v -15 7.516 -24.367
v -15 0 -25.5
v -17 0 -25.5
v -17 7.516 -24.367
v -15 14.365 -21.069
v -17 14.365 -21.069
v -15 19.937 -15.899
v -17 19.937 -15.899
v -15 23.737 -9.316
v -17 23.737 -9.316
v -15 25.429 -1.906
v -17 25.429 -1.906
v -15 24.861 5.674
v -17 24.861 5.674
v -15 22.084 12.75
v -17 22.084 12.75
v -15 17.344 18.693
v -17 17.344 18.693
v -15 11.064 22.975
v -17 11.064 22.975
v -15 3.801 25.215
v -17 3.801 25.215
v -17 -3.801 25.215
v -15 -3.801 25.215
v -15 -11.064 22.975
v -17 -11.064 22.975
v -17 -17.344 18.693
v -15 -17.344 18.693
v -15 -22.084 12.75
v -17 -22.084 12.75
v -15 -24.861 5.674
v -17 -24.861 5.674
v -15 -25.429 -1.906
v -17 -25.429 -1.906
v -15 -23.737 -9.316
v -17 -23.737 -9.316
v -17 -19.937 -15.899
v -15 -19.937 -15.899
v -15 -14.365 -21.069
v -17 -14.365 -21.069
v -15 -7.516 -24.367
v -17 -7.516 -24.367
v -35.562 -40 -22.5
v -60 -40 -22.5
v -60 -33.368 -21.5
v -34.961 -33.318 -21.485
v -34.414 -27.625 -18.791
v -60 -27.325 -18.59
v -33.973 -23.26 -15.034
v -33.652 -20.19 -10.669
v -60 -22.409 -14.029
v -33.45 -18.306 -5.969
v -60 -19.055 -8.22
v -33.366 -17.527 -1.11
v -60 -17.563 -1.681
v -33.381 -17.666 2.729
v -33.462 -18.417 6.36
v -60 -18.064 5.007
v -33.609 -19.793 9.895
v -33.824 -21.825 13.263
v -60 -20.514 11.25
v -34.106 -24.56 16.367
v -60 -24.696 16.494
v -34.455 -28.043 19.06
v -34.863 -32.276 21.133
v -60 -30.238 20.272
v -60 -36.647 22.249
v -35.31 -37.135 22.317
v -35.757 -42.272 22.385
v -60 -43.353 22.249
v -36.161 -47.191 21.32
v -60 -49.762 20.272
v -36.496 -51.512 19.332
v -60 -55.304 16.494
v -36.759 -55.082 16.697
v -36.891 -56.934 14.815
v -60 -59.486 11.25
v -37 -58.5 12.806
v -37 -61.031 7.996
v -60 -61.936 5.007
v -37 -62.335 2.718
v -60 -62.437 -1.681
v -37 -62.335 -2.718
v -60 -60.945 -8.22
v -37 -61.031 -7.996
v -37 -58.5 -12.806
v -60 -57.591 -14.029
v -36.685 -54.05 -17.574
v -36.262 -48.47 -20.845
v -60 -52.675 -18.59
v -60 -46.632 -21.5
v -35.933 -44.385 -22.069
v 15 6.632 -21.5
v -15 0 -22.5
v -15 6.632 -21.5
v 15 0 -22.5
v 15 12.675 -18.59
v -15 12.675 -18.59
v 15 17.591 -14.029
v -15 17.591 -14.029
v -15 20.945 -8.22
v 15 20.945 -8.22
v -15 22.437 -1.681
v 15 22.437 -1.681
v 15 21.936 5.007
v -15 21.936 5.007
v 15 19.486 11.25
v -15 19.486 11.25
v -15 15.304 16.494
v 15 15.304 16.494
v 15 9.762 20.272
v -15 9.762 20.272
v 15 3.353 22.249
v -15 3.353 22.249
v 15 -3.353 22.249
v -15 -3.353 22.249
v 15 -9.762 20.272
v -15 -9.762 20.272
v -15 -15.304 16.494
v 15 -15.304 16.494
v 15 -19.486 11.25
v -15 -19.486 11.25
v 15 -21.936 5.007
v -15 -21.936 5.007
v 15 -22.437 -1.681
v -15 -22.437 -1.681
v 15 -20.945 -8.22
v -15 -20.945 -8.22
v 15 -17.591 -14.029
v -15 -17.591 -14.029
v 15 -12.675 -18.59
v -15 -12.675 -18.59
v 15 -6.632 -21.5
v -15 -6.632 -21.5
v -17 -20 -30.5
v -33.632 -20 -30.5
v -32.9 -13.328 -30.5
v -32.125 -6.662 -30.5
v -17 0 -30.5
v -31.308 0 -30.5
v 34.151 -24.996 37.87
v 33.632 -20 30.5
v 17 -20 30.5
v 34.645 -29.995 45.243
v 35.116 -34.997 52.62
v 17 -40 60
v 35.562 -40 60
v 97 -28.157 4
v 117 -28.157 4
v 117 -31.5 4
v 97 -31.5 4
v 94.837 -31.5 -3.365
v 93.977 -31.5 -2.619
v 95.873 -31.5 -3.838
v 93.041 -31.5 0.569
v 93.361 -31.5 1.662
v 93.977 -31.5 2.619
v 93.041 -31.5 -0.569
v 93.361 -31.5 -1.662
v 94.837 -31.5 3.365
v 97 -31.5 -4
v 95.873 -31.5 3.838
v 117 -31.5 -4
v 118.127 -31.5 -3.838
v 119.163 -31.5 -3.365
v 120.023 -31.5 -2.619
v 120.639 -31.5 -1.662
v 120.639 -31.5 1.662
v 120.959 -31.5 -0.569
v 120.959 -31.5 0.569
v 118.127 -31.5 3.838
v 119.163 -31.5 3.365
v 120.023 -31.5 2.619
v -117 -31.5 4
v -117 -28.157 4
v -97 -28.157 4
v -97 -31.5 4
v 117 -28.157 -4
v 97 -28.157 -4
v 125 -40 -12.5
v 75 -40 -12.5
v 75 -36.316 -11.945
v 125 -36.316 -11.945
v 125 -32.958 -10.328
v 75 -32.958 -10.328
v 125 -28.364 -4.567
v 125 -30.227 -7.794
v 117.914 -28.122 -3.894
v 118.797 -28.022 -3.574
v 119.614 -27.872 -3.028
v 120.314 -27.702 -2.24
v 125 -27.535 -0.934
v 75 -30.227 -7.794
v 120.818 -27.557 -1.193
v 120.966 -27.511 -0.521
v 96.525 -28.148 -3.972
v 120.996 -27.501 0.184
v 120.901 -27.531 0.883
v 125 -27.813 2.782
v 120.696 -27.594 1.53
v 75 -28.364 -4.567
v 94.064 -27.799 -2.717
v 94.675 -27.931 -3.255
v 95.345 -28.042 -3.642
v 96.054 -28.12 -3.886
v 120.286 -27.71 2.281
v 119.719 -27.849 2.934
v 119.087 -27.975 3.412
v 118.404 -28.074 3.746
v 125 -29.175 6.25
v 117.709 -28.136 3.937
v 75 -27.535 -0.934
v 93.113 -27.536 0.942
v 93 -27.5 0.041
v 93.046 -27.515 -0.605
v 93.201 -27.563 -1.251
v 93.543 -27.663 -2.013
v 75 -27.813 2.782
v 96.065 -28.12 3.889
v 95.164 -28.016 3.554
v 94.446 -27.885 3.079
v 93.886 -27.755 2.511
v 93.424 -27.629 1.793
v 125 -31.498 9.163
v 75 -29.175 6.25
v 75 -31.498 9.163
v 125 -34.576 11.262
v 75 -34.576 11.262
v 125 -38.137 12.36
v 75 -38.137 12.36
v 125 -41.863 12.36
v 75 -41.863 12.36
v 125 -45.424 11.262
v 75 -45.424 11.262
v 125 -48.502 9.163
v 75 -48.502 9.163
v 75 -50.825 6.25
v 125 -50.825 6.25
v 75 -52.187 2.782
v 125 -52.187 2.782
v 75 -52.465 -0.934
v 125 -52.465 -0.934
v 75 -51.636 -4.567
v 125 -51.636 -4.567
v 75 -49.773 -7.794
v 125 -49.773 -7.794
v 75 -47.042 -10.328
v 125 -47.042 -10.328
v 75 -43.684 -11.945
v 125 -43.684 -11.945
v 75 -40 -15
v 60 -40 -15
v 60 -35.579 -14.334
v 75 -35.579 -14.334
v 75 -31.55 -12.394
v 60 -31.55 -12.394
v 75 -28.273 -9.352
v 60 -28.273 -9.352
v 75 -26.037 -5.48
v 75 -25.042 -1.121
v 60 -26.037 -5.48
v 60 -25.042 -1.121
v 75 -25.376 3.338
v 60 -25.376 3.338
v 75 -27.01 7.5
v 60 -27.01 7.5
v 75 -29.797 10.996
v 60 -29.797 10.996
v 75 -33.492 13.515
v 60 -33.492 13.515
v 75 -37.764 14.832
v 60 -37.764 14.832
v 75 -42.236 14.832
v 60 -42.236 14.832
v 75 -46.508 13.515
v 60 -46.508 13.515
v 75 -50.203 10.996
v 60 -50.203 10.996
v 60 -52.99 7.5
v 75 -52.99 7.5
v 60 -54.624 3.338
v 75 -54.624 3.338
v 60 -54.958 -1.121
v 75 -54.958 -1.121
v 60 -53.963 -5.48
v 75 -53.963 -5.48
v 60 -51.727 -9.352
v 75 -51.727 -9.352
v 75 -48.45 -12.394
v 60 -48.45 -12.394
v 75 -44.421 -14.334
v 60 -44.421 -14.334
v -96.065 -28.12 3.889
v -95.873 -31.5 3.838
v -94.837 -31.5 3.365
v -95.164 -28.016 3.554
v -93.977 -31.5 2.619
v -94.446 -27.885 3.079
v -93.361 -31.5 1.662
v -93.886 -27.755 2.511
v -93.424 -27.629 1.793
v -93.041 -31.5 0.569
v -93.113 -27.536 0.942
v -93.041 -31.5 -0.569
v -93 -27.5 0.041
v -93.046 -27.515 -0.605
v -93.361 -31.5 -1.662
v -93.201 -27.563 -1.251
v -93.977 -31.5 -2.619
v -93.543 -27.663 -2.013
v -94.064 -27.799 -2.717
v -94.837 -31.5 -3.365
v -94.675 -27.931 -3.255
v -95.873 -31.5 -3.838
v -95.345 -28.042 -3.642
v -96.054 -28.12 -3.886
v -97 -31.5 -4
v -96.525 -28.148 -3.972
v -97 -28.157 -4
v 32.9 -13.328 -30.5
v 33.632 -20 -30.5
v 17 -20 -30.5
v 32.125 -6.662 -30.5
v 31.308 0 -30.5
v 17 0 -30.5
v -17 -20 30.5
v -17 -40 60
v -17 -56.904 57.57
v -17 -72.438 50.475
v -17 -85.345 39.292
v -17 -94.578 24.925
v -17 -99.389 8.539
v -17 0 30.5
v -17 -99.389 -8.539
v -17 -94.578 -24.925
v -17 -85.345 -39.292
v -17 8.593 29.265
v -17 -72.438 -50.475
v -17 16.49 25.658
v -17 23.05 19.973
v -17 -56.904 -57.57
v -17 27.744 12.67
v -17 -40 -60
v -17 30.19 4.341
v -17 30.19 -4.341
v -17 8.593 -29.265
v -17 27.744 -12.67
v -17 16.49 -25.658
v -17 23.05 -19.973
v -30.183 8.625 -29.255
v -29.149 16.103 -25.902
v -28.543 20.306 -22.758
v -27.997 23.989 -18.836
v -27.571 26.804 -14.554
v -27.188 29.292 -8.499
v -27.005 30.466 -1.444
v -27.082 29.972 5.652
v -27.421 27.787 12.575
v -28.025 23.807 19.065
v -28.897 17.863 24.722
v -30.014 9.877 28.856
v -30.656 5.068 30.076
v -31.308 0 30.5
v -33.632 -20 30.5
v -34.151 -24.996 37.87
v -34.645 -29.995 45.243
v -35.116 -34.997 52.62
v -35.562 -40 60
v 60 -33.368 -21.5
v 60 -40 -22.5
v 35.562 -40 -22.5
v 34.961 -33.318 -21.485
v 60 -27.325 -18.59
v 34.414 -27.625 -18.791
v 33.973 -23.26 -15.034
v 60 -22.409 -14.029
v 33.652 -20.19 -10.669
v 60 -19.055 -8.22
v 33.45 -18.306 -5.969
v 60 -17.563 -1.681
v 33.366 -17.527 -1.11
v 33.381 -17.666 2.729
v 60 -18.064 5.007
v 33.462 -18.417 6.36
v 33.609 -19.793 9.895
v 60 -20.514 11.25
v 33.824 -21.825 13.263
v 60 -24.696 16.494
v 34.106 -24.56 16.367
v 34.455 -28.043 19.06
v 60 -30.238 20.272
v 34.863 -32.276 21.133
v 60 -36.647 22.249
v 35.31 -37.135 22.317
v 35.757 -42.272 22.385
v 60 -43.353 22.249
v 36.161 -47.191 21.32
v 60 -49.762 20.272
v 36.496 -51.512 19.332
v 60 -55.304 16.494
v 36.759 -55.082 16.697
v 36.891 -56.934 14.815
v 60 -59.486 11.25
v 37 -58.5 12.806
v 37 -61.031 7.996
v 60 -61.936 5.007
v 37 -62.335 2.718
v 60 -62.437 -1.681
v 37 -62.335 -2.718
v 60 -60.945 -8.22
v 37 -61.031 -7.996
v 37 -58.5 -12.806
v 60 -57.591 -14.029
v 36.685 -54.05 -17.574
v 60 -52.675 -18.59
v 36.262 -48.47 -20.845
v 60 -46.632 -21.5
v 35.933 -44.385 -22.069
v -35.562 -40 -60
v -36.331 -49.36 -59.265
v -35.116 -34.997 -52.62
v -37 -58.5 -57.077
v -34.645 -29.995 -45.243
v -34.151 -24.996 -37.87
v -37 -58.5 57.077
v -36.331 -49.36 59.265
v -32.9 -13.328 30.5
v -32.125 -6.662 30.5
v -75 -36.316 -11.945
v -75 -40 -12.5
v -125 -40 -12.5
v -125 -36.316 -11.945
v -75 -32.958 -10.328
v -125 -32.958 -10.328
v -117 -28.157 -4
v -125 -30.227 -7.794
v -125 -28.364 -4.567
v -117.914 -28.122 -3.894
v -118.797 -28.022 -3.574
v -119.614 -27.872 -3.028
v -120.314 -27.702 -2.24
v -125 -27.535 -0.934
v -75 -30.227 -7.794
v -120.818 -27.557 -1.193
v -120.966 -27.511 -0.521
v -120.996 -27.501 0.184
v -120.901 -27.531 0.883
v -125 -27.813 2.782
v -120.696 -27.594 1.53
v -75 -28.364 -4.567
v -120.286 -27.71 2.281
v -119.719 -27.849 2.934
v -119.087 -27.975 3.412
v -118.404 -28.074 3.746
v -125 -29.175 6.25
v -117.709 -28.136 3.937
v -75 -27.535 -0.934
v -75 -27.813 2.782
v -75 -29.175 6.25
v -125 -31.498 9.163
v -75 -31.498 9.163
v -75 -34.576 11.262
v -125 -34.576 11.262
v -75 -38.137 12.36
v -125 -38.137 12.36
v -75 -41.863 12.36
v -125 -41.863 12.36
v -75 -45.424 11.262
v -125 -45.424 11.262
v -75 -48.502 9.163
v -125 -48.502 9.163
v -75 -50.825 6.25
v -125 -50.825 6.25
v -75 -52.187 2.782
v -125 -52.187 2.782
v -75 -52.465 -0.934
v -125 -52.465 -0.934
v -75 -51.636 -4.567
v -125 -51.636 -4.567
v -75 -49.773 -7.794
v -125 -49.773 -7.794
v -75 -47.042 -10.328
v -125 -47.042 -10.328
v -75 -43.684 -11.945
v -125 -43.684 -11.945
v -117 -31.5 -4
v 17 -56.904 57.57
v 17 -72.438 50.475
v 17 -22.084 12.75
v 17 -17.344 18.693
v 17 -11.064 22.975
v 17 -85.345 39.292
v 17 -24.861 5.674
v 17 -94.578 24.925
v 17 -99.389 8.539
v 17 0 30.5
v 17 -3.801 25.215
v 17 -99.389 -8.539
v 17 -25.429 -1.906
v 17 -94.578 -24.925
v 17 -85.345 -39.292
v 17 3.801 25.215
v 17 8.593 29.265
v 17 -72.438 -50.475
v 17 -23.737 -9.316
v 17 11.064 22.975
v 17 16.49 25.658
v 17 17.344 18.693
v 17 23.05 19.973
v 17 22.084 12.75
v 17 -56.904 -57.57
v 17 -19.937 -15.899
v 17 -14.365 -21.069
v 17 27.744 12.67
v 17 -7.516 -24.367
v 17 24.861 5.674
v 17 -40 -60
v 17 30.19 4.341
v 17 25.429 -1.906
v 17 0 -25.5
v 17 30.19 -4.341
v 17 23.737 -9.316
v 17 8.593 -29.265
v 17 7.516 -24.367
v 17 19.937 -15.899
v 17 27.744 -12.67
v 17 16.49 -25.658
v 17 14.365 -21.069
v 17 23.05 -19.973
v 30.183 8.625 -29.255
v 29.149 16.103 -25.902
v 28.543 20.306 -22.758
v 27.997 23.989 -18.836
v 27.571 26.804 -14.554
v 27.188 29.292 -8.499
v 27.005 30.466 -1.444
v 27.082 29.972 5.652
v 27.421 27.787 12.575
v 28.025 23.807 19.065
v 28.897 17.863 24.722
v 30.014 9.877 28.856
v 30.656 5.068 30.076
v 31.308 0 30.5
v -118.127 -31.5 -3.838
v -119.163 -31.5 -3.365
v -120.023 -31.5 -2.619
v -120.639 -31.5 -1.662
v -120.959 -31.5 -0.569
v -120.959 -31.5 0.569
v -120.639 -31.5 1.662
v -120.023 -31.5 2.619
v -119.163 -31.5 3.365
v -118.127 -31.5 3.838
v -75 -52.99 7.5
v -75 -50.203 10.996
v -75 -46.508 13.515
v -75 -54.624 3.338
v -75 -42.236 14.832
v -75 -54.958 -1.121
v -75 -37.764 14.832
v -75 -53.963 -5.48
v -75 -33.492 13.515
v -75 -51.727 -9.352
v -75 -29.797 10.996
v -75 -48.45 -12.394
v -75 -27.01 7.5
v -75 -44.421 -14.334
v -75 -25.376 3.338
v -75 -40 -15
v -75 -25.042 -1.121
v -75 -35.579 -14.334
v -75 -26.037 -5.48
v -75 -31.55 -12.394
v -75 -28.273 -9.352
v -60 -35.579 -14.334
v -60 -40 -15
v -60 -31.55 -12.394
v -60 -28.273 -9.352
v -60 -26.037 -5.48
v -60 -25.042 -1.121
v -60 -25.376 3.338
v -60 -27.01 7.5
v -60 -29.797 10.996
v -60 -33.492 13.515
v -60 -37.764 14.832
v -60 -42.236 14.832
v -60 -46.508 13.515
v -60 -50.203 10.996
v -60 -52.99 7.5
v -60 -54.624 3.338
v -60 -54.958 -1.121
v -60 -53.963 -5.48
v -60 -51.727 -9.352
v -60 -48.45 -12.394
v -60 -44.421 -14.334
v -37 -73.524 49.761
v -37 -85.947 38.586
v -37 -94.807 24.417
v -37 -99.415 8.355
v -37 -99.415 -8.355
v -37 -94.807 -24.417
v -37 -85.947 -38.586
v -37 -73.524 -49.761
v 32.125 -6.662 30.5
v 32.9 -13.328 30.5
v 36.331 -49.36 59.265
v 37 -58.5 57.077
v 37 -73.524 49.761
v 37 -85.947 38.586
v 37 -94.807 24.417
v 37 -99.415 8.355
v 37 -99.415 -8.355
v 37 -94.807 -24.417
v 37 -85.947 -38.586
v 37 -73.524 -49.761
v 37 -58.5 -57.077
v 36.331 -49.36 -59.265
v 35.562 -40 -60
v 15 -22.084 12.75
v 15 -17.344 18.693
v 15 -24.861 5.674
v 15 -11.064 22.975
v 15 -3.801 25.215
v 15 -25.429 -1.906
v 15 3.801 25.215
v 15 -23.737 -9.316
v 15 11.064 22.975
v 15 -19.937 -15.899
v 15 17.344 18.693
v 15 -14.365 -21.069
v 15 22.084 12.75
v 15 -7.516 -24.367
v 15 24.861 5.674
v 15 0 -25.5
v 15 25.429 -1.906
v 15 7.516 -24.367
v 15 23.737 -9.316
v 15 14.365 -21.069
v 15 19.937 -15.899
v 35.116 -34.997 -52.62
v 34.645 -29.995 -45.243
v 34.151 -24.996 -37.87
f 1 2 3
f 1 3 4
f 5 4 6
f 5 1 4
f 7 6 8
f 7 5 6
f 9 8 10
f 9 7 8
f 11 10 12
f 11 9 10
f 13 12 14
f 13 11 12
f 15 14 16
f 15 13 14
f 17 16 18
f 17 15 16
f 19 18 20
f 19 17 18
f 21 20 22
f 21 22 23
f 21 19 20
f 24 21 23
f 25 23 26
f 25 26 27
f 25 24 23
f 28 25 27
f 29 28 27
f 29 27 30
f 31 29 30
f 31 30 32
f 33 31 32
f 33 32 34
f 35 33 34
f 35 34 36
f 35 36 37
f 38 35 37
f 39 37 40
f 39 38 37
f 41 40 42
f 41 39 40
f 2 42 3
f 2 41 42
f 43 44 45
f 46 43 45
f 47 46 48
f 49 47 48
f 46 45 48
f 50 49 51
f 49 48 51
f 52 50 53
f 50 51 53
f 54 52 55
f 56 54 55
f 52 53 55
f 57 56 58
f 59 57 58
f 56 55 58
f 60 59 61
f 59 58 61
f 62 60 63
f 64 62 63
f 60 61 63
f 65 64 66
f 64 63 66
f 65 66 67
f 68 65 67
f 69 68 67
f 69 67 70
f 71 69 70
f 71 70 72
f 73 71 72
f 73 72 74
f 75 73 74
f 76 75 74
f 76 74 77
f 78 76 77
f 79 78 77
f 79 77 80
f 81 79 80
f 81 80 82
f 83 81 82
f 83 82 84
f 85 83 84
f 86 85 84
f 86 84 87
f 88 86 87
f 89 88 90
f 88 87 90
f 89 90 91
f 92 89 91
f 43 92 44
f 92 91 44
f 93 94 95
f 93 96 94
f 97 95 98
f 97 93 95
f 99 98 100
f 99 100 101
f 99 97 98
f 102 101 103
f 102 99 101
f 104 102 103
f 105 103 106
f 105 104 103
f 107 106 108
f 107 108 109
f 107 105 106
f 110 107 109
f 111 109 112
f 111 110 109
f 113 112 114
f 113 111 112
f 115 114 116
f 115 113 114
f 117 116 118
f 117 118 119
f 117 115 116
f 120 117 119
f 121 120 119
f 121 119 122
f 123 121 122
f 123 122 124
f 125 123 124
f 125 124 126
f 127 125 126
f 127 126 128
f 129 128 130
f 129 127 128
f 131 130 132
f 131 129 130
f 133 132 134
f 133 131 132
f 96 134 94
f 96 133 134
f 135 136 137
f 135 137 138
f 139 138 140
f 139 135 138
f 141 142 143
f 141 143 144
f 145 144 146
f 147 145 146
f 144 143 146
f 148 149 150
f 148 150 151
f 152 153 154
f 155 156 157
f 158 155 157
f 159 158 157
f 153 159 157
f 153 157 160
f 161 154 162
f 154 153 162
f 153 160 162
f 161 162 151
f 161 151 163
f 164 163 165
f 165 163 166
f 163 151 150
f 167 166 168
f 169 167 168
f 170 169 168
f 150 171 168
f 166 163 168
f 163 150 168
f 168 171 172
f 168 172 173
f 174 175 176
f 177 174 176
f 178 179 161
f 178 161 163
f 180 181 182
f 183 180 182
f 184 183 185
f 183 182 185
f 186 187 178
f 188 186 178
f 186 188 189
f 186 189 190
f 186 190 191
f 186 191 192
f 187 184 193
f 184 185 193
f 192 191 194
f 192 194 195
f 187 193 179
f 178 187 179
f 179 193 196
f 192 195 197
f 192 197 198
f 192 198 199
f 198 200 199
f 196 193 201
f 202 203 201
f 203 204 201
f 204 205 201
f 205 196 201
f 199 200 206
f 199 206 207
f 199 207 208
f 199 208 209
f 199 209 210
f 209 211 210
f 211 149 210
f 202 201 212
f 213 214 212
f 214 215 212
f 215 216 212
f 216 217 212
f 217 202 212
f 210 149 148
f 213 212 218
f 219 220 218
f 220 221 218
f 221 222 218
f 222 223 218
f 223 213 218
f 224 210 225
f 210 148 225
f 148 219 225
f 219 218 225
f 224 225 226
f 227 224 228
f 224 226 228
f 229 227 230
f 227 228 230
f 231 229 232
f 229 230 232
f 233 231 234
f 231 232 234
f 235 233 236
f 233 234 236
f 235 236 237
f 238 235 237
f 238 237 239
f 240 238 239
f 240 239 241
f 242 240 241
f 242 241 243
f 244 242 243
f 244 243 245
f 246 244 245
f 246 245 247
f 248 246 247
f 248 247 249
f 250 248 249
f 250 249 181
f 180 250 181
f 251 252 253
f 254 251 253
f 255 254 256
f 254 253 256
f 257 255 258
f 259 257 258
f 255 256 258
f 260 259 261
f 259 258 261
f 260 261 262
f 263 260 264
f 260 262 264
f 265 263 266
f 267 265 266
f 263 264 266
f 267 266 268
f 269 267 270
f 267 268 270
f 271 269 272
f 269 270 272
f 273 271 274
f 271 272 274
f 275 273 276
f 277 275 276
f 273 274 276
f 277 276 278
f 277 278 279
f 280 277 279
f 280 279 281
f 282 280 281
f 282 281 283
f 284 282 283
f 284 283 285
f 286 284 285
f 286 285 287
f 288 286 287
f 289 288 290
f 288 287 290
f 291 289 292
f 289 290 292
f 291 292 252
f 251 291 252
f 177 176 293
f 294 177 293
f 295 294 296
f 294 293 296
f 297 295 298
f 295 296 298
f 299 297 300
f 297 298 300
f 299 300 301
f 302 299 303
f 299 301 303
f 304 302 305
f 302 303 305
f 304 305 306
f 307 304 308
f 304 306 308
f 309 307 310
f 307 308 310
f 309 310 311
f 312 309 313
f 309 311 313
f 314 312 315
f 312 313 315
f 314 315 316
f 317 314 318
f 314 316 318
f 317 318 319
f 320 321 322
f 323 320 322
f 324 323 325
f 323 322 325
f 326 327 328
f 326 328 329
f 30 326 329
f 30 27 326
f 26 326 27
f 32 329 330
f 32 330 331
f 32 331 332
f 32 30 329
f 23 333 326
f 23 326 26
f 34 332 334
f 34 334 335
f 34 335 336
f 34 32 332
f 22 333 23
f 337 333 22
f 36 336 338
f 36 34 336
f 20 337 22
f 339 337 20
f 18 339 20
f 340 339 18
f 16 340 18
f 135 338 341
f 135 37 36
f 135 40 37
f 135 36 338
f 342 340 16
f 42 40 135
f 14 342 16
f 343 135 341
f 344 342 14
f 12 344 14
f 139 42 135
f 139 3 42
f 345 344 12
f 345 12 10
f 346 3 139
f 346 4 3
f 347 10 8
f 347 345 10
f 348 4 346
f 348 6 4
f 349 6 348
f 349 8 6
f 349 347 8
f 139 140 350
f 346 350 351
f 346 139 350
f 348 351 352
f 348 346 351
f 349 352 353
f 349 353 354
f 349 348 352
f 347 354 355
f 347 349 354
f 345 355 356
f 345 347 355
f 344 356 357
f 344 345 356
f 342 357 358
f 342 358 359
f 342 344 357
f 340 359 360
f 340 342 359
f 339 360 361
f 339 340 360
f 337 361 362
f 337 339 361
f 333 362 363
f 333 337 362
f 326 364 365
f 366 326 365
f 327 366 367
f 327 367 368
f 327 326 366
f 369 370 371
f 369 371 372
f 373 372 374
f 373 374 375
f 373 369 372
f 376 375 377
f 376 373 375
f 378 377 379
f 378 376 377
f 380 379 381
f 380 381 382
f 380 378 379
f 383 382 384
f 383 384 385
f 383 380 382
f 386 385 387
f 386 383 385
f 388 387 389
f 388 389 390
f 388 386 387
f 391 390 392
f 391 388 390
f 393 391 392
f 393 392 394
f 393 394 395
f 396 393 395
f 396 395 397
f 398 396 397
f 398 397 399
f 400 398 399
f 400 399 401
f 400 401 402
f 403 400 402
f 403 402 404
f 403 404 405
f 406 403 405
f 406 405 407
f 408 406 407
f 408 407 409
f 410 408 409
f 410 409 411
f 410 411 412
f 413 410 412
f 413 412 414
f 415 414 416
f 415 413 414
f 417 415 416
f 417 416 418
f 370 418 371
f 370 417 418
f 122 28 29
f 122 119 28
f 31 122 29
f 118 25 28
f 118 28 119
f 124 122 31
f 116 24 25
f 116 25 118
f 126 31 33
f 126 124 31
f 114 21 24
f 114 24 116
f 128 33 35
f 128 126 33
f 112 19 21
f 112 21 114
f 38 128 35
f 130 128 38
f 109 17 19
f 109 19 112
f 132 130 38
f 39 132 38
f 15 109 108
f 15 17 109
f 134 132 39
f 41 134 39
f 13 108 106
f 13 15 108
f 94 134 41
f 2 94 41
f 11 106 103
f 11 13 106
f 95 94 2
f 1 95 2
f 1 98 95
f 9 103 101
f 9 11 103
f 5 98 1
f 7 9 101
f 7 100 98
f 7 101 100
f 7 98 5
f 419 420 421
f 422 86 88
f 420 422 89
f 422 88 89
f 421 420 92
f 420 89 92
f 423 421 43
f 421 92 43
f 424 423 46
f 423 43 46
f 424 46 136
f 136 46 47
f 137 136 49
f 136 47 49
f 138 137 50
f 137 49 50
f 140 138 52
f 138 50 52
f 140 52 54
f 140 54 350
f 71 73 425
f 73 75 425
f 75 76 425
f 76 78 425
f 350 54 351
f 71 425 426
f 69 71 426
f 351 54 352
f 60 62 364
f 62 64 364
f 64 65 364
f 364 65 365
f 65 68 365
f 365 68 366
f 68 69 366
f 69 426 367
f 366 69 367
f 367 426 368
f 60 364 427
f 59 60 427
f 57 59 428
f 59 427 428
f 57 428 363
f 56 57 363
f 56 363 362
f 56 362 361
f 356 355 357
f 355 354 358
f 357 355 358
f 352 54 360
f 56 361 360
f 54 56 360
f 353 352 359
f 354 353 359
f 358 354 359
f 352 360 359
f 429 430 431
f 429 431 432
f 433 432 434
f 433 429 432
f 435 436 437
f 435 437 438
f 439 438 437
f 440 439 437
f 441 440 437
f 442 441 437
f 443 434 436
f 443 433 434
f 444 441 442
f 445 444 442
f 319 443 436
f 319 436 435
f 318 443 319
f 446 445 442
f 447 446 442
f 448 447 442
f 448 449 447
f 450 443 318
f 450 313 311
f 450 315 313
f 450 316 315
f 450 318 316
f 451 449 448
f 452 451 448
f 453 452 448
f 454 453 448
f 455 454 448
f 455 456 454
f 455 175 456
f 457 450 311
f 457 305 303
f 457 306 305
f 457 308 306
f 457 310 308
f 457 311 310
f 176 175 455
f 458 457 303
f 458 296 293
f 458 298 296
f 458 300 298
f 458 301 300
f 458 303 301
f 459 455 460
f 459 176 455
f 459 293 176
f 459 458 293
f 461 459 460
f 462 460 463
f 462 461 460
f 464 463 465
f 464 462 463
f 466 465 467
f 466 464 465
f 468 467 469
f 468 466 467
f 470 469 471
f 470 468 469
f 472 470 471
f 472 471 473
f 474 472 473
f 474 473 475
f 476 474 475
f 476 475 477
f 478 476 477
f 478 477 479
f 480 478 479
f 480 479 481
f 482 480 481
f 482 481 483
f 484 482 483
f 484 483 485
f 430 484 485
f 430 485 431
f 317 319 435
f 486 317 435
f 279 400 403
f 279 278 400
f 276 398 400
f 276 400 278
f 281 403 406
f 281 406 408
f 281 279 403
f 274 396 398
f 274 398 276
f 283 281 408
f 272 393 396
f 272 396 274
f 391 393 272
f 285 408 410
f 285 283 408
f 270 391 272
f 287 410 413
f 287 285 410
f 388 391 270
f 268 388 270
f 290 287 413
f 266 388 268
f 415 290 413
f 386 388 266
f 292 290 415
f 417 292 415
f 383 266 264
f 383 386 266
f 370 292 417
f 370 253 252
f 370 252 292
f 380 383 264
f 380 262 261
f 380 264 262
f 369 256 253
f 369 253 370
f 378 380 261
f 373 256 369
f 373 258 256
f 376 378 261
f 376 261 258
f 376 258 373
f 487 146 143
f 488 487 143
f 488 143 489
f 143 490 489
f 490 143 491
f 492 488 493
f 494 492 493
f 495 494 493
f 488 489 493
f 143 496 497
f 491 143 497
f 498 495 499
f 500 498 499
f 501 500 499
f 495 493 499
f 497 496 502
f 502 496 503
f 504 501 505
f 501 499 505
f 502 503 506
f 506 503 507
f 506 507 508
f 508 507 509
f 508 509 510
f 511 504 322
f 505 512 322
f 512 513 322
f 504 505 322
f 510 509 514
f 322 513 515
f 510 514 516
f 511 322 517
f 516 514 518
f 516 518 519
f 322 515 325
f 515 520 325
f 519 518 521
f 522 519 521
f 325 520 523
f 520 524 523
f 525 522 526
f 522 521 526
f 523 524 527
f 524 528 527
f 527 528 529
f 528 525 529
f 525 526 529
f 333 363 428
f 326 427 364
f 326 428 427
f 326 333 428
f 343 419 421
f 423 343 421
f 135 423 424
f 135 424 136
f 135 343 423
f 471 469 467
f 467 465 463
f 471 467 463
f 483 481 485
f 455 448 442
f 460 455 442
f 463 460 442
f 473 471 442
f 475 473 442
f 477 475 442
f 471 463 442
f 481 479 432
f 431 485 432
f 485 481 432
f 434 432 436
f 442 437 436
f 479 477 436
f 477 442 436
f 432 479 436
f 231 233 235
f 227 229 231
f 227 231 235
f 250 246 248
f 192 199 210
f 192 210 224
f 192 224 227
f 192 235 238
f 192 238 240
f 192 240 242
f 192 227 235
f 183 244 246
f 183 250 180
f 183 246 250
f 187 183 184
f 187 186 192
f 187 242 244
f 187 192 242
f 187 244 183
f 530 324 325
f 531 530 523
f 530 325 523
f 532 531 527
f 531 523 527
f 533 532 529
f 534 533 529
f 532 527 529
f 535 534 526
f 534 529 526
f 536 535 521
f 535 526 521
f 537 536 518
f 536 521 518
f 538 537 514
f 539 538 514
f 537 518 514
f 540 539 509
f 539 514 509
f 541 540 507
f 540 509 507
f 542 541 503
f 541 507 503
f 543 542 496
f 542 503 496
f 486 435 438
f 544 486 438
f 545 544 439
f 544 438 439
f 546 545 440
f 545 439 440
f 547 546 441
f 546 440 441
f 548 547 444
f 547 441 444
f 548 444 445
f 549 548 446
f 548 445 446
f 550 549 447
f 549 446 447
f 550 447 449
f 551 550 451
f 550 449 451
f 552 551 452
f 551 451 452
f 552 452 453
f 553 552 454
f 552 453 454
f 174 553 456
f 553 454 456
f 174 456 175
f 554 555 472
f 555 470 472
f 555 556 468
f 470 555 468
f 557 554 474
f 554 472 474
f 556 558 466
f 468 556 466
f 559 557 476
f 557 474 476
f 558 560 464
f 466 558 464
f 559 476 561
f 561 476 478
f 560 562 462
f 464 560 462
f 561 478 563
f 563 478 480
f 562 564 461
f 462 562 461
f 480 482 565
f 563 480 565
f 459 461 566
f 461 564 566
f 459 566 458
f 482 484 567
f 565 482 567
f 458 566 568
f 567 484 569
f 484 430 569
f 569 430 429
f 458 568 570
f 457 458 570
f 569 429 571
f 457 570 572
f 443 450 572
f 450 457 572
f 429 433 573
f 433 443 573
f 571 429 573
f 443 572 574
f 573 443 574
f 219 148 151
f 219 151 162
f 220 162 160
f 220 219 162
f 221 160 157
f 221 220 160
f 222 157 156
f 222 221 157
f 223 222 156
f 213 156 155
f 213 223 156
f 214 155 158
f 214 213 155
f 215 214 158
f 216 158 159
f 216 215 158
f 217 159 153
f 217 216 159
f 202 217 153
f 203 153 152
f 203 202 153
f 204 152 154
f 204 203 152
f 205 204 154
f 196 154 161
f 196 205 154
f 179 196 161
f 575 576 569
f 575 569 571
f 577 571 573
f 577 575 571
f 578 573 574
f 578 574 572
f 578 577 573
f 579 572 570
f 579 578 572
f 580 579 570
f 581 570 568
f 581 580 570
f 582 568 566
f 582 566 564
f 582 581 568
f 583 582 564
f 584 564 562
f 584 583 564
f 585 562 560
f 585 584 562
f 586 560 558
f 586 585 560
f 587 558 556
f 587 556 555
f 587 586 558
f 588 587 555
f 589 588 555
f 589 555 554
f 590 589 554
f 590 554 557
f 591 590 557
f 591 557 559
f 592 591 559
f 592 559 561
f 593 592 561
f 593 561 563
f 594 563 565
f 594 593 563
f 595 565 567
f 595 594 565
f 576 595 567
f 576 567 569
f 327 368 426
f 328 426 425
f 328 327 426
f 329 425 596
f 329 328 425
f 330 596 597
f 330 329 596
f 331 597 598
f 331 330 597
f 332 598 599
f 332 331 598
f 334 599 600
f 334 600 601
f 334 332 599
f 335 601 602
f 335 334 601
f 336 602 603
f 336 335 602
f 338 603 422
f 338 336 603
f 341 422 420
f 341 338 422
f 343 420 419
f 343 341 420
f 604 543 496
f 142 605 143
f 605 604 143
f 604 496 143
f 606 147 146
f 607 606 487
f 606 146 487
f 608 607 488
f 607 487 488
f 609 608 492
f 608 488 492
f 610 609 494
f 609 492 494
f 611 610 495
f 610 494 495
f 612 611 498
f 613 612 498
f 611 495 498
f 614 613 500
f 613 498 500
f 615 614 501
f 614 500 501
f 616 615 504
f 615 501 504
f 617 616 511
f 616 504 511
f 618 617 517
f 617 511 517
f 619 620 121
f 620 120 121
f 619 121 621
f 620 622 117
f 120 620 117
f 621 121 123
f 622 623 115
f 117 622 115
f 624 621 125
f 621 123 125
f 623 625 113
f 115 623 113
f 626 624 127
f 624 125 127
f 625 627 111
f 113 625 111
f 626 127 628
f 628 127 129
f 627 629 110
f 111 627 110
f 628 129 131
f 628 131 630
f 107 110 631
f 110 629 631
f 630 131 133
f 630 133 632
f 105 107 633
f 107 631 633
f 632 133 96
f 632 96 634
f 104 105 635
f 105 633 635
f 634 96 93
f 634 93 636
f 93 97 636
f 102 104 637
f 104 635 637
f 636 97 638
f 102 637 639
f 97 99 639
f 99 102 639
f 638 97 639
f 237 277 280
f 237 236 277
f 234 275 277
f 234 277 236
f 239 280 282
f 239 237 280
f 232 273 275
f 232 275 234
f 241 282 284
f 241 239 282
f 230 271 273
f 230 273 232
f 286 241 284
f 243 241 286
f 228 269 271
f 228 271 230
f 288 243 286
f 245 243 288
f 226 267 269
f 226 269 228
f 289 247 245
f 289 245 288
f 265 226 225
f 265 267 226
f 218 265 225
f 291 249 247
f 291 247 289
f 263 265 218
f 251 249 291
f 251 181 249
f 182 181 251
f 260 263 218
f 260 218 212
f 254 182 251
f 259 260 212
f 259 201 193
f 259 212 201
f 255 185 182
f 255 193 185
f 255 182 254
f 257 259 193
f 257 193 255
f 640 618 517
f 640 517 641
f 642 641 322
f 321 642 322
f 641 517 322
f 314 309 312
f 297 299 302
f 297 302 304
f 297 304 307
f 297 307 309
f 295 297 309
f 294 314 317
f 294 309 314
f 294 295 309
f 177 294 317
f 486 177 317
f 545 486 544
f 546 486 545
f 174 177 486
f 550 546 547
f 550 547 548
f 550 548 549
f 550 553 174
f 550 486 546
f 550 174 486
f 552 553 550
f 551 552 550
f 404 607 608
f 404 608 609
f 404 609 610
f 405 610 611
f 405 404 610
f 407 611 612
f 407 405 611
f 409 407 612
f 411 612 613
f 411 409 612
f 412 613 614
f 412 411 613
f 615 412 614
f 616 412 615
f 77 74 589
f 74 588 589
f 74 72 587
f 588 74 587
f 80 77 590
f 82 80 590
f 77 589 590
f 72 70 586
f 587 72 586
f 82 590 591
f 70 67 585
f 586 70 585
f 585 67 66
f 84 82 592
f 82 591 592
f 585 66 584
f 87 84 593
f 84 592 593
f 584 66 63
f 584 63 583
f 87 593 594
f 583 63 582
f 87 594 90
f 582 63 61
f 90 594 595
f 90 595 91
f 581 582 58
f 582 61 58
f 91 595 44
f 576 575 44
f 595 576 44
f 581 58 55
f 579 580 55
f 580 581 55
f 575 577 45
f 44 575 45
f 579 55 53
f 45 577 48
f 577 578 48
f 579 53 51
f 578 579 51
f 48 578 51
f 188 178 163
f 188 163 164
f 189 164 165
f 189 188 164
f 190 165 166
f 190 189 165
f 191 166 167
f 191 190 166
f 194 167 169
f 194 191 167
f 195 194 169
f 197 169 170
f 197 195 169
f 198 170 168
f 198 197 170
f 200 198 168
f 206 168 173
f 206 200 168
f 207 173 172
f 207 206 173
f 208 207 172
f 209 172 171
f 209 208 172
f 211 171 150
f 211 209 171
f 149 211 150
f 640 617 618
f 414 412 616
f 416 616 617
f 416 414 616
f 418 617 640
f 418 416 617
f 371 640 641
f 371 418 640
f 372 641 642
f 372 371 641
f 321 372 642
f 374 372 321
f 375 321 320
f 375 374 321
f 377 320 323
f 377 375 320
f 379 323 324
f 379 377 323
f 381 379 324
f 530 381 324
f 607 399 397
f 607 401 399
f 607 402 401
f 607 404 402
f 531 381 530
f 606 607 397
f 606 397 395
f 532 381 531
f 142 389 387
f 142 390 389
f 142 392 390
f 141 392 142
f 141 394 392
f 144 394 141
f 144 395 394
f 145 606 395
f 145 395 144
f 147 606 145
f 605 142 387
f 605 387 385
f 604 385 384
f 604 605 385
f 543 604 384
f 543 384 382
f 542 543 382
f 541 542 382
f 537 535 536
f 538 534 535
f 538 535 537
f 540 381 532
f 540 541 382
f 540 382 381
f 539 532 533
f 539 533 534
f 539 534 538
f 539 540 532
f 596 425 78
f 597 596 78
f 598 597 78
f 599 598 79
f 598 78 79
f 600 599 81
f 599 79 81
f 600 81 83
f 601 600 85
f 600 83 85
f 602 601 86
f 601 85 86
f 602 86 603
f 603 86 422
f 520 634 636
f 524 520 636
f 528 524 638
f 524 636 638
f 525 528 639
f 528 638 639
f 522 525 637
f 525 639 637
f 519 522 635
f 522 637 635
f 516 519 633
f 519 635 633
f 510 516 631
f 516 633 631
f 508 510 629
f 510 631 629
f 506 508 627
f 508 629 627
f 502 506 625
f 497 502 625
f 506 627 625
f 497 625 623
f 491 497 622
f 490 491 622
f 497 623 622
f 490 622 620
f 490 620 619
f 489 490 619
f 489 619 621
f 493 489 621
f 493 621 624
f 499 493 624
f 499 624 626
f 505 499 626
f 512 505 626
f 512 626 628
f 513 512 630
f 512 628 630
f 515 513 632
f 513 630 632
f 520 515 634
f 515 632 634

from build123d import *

# Parameters (mm, degrees)
SKETCH1_R           = 22.5
BOSS_EXTRUDE1_DEPTH = 15
SKETCH2_R           = 25.5
BOSS_EXTRUDE2_DEPTH = 2
BOSS_EXTRUDE3_DEPTH = 20
CUT_EXTRUDE1_DEPTH  = 99
BOSS_EXTRUDE4_REACH = 77
SKETCH5_R           = 22.5
SKETCH6_R           = 15
BOSS_EXTRUDE5_DEPTH = 15
SKETCH7_R           = 12.5
BOSS_EXTRUDE6_DEPTH = 50
CUT_EXTRUDE2_DEPTH  = 4


with BuildPart() as part:
    # Sketch1 → Boss-Extrude1 (new body, symmetric)
    with BuildSketch(Plane(origin=(0, 0, 0), x_dir=(0, 0, -1), z_dir=(1, 0, 0))):
        Circle(SKETCH1_R)
    extrude(amount=BOSS_EXTRUDE1_DEPTH, both=True)

    # Sketch2 → Boss-Extrude2 (add)
    with BuildSketch(Plane(origin=(15, 0, 0), x_dir=(0, 0, -1), z_dir=(1, 0, 0))):
        Circle(SKETCH2_R)
    extrude(amount=BOSS_EXTRUDE2_DEPTH)

    # Sketch3 → Boss-Extrude3 (add)
    with BuildSketch(Plane(origin=(17, 0, 0), x_dir=(0, 0, -1), z_dir=(1, 0, 0))):
        with BuildLine():
            Line((-30.5, 0), (-30.5, -20))
            Line((-30.5, -20), (-60, -40))
            ThreePointArc((-60, -40), (0, -100), (60, -40))
            Line((60, -40), (30.5, -20))
            Line((30.5, -20), (30.5, 0))
            ThreePointArc((30.5, 0), (0, 30.5), (-30.5, 0))
        make_face()
    extrude(amount=BOSS_EXTRUDE3_DEPTH)

    # Sketch4 → Cut-Extrude1 (cut, symmetric)
    with BuildSketch(Plane.XY):
        with BuildLine():
            Line((27, 30.5), (37, 30.5))
            Line((37, 30.5), (37, -58.5))
            ThreePointArc((37, -58.5), (32.963579083, -13.891732687), (27, 30.5))
        make_face()
    extrude(amount=CUT_EXTRUDE1_DEPTH, both=True, mode=Mode.SUBTRACT)

    # Sketch5 → Boss-Extrude4 (add, up to next)
    with BuildSketch(Plane(origin=(60, 0, 0), x_dir=(0, 0, -1), z_dir=(1, 0, 0)), mode=Mode.PRIVATE) as boss_extrude4_sk1:
        with Locations((0, -40)):
            Circle(SKETCH5_R)
    boss_extrude4_tool1 = extrude(boss_extrude4_sk1.sketch, amount=-BOSS_EXTRUDE4_REACH, mode=Mode.PRIVATE) - part.part
    add(boss_extrude4_tool1.solids().sort_by_distance((60, -40, 0))[0])

    # Sketch6 → Boss-Extrude5 (add)
    with BuildSketch(Plane(origin=(60, 0, 0), x_dir=(0, 0, -1), z_dir=(1, 0, 0))):
        with Locations((0, -40)):
            Circle(SKETCH6_R)
    extrude(amount=BOSS_EXTRUDE5_DEPTH)

    # Sketch7 → Boss-Extrude6 (add)
    with BuildSketch(Plane(origin=(75, 0, 0), x_dir=(0, 0, -1), z_dir=(1, 0, 0))):
        with Locations((0, -40)):
            Circle(SKETCH7_R)
    extrude(amount=BOSS_EXTRUDE6_DEPTH)

    # Sketch9 → Cut-Extrude2 (cut)
    with BuildSketch(Plane(origin=(0, -27.5, 0), x_dir=(-1, 0, 0), z_dir=(0, 1, 0))):
        with BuildLine():
            Line((-97, -4), (-117, -4))
            ThreePointArc((-117, -4), (-121, 0), (-117, 4))
            Line((-117, 4), (-97, 4))
            ThreePointArc((-97, 4), (-93, 0), (-97, -4))
        make_face()
    extrude(amount=-CUT_EXTRUDE2_DEPTH, mode=Mode.SUBTRACT)

    # Mirror2: part across plane


with BuildPart() as part_1:
    add(part.part)
    add(part.part.mirror(Plane(origin=(0, 0, 0), x_dir=(0, 0, 1), z_dir=(1, 0, 0))))


solid = part_1.part
